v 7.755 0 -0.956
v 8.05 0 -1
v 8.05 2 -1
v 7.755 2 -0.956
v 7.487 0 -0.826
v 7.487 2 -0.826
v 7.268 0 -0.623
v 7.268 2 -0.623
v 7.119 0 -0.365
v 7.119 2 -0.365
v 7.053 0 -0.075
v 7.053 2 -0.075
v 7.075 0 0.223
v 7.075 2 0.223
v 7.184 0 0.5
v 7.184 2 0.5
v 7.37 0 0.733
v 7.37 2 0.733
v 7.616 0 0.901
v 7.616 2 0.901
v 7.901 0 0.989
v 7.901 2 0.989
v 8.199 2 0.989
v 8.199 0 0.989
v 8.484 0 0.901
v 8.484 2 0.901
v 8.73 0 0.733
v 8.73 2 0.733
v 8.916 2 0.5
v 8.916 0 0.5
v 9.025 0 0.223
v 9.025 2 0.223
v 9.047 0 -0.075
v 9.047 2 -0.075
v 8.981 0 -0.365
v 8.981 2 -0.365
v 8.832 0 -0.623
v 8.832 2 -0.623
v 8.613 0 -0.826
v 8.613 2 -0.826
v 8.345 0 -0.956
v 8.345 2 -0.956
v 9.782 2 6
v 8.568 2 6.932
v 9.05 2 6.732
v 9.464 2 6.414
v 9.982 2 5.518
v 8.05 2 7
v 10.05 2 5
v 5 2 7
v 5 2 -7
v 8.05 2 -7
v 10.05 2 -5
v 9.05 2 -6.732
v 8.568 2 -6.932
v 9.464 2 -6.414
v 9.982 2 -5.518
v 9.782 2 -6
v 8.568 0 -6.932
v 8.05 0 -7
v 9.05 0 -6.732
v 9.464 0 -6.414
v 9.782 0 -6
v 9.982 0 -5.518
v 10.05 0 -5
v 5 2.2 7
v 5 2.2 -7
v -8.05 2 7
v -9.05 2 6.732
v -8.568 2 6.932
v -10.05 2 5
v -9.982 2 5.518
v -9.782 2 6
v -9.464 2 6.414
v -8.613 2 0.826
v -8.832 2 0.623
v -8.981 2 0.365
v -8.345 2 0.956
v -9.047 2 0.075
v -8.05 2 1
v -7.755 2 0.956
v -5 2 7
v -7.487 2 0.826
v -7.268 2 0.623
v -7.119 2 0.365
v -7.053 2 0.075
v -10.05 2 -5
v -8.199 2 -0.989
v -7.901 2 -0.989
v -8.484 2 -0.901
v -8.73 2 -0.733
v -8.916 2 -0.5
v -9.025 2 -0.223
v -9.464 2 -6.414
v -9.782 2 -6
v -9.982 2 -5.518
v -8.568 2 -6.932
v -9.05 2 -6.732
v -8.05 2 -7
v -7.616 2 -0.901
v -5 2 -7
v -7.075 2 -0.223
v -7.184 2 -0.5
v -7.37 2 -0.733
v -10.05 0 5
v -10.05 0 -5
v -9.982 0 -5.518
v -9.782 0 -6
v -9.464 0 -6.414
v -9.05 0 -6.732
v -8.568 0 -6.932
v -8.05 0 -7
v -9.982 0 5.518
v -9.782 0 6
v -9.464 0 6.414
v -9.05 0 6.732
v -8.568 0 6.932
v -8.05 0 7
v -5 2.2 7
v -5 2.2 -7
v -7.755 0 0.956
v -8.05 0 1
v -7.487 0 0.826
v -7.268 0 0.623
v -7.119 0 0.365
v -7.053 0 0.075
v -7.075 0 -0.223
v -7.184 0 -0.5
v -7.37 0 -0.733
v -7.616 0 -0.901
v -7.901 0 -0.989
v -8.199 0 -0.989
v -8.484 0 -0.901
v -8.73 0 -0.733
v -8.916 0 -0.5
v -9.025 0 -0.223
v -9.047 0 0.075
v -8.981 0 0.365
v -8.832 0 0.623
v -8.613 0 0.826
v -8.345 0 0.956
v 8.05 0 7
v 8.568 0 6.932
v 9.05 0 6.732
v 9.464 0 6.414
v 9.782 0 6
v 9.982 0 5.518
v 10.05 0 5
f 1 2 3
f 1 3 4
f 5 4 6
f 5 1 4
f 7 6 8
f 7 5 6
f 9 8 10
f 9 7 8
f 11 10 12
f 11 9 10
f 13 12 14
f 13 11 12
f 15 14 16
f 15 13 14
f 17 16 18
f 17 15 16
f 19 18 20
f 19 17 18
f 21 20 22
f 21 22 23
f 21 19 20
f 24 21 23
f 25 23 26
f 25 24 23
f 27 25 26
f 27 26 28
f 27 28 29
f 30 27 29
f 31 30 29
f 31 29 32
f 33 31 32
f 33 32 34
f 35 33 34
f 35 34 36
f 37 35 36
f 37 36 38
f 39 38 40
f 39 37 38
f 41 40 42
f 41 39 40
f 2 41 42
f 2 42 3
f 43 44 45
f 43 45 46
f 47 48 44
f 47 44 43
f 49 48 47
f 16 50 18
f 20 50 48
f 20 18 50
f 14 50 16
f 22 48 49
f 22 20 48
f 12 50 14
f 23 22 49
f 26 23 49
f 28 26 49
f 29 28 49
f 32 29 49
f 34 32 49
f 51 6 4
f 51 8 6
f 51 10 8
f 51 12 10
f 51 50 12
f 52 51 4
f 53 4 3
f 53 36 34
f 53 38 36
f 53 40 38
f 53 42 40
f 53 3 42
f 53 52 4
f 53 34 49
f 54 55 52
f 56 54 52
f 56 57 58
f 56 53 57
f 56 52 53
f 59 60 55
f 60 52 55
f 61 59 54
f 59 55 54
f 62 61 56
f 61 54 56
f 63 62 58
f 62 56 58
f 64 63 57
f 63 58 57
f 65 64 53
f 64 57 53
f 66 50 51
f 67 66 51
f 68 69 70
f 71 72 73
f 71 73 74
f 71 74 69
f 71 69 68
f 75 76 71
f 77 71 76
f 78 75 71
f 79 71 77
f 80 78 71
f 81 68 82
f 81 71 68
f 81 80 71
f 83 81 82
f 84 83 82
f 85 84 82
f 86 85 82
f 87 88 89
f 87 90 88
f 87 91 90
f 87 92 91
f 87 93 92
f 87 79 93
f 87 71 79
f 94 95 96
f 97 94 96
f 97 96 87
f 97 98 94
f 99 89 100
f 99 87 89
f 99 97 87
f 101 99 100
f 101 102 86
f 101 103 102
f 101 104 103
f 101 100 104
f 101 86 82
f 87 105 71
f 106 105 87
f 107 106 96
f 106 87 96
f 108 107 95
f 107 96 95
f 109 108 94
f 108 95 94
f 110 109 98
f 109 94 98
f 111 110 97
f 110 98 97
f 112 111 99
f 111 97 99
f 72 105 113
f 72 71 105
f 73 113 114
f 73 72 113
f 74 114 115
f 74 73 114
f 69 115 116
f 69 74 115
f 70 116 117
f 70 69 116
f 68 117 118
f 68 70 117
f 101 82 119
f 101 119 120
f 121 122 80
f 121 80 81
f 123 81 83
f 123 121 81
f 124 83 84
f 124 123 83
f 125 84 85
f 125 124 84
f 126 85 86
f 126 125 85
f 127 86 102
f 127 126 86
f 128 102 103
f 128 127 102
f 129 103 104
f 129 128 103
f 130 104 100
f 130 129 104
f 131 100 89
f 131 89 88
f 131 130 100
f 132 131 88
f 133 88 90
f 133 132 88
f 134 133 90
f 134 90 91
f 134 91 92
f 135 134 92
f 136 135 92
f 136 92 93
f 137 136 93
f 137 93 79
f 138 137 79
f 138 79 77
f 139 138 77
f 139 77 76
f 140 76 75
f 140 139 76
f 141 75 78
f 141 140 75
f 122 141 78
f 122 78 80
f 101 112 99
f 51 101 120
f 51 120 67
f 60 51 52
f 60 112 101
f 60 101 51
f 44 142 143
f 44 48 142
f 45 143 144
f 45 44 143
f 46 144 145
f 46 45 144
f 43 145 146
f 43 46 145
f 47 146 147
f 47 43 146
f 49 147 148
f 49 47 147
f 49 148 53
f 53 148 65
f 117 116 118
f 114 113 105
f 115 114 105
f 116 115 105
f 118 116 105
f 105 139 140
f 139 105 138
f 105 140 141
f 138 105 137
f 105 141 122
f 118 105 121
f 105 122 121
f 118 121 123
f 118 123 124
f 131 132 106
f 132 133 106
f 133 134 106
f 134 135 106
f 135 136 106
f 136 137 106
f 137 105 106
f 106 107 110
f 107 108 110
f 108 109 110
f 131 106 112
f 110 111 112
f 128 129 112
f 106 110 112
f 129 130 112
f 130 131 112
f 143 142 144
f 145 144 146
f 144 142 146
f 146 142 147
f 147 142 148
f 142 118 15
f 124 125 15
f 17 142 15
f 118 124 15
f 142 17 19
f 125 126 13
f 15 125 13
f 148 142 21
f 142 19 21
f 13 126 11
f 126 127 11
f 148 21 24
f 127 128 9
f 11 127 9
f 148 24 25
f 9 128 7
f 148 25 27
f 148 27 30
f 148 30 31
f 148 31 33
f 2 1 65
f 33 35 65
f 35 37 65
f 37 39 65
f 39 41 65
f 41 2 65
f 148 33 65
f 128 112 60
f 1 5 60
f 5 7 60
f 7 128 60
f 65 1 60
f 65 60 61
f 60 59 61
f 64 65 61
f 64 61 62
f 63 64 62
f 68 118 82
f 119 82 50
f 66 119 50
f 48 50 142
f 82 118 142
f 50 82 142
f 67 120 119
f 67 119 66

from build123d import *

# Parameters (mm, degrees)
SKETCH_1_W      = 20.1
SKETCH_1_H      = 14
SKETCH_1_R      = 1
EXTRUDE_1_DEPTH = 2
SKETCH_2_W      = 10
SKETCH_2_H      = 14
EXTRUDE_2_DEPTH = 0.2
FILLET_1_R      = 2


with BuildPart() as part:
    # 草图1 → 凸台-拉伸1 (new body)
    with BuildSketch(Plane(origin=(0, 0, 0), x_dir=(1, 0, 0), z_dir=(0, 1, 0))):
        Rectangle(SKETCH_1_W, SKETCH_1_H)
        with Locations(Location((-8.05, 0, 0), (0, 0, 270))):
            Circle(SKETCH_1_R, mode=Mode.SUBTRACT)
        with Locations(Location((8.05, 0, 0), (0, 0, 90))):
            Circle(SKETCH_1_R, mode=Mode.SUBTRACT)
    extrude(amount=EXTRUDE_1_DEPTH)

    # 草图2 → 凸台-拉伸2 (add)
    with BuildSketch(Plane(origin=(0, 2, 0), x_dir=(1, 0, 0), z_dir=(0, 1, 0))):
        Rectangle(SKETCH_2_W, SKETCH_2_H)
    extrude(amount=EXTRUDE_2_DEPTH)

    # 圆角1
    fillet_1_edges = [part.edges().sort_by_distance(p)[0] for p in [
        (10.05, 1, 7),
        (-10.05, 1, 7),
        (-10.05, 1, -7),
        (10.05, 1, -7),
    ]]
    fillet(fillet_1_edges, radius=FILLET_1_R)


solid = part.part
